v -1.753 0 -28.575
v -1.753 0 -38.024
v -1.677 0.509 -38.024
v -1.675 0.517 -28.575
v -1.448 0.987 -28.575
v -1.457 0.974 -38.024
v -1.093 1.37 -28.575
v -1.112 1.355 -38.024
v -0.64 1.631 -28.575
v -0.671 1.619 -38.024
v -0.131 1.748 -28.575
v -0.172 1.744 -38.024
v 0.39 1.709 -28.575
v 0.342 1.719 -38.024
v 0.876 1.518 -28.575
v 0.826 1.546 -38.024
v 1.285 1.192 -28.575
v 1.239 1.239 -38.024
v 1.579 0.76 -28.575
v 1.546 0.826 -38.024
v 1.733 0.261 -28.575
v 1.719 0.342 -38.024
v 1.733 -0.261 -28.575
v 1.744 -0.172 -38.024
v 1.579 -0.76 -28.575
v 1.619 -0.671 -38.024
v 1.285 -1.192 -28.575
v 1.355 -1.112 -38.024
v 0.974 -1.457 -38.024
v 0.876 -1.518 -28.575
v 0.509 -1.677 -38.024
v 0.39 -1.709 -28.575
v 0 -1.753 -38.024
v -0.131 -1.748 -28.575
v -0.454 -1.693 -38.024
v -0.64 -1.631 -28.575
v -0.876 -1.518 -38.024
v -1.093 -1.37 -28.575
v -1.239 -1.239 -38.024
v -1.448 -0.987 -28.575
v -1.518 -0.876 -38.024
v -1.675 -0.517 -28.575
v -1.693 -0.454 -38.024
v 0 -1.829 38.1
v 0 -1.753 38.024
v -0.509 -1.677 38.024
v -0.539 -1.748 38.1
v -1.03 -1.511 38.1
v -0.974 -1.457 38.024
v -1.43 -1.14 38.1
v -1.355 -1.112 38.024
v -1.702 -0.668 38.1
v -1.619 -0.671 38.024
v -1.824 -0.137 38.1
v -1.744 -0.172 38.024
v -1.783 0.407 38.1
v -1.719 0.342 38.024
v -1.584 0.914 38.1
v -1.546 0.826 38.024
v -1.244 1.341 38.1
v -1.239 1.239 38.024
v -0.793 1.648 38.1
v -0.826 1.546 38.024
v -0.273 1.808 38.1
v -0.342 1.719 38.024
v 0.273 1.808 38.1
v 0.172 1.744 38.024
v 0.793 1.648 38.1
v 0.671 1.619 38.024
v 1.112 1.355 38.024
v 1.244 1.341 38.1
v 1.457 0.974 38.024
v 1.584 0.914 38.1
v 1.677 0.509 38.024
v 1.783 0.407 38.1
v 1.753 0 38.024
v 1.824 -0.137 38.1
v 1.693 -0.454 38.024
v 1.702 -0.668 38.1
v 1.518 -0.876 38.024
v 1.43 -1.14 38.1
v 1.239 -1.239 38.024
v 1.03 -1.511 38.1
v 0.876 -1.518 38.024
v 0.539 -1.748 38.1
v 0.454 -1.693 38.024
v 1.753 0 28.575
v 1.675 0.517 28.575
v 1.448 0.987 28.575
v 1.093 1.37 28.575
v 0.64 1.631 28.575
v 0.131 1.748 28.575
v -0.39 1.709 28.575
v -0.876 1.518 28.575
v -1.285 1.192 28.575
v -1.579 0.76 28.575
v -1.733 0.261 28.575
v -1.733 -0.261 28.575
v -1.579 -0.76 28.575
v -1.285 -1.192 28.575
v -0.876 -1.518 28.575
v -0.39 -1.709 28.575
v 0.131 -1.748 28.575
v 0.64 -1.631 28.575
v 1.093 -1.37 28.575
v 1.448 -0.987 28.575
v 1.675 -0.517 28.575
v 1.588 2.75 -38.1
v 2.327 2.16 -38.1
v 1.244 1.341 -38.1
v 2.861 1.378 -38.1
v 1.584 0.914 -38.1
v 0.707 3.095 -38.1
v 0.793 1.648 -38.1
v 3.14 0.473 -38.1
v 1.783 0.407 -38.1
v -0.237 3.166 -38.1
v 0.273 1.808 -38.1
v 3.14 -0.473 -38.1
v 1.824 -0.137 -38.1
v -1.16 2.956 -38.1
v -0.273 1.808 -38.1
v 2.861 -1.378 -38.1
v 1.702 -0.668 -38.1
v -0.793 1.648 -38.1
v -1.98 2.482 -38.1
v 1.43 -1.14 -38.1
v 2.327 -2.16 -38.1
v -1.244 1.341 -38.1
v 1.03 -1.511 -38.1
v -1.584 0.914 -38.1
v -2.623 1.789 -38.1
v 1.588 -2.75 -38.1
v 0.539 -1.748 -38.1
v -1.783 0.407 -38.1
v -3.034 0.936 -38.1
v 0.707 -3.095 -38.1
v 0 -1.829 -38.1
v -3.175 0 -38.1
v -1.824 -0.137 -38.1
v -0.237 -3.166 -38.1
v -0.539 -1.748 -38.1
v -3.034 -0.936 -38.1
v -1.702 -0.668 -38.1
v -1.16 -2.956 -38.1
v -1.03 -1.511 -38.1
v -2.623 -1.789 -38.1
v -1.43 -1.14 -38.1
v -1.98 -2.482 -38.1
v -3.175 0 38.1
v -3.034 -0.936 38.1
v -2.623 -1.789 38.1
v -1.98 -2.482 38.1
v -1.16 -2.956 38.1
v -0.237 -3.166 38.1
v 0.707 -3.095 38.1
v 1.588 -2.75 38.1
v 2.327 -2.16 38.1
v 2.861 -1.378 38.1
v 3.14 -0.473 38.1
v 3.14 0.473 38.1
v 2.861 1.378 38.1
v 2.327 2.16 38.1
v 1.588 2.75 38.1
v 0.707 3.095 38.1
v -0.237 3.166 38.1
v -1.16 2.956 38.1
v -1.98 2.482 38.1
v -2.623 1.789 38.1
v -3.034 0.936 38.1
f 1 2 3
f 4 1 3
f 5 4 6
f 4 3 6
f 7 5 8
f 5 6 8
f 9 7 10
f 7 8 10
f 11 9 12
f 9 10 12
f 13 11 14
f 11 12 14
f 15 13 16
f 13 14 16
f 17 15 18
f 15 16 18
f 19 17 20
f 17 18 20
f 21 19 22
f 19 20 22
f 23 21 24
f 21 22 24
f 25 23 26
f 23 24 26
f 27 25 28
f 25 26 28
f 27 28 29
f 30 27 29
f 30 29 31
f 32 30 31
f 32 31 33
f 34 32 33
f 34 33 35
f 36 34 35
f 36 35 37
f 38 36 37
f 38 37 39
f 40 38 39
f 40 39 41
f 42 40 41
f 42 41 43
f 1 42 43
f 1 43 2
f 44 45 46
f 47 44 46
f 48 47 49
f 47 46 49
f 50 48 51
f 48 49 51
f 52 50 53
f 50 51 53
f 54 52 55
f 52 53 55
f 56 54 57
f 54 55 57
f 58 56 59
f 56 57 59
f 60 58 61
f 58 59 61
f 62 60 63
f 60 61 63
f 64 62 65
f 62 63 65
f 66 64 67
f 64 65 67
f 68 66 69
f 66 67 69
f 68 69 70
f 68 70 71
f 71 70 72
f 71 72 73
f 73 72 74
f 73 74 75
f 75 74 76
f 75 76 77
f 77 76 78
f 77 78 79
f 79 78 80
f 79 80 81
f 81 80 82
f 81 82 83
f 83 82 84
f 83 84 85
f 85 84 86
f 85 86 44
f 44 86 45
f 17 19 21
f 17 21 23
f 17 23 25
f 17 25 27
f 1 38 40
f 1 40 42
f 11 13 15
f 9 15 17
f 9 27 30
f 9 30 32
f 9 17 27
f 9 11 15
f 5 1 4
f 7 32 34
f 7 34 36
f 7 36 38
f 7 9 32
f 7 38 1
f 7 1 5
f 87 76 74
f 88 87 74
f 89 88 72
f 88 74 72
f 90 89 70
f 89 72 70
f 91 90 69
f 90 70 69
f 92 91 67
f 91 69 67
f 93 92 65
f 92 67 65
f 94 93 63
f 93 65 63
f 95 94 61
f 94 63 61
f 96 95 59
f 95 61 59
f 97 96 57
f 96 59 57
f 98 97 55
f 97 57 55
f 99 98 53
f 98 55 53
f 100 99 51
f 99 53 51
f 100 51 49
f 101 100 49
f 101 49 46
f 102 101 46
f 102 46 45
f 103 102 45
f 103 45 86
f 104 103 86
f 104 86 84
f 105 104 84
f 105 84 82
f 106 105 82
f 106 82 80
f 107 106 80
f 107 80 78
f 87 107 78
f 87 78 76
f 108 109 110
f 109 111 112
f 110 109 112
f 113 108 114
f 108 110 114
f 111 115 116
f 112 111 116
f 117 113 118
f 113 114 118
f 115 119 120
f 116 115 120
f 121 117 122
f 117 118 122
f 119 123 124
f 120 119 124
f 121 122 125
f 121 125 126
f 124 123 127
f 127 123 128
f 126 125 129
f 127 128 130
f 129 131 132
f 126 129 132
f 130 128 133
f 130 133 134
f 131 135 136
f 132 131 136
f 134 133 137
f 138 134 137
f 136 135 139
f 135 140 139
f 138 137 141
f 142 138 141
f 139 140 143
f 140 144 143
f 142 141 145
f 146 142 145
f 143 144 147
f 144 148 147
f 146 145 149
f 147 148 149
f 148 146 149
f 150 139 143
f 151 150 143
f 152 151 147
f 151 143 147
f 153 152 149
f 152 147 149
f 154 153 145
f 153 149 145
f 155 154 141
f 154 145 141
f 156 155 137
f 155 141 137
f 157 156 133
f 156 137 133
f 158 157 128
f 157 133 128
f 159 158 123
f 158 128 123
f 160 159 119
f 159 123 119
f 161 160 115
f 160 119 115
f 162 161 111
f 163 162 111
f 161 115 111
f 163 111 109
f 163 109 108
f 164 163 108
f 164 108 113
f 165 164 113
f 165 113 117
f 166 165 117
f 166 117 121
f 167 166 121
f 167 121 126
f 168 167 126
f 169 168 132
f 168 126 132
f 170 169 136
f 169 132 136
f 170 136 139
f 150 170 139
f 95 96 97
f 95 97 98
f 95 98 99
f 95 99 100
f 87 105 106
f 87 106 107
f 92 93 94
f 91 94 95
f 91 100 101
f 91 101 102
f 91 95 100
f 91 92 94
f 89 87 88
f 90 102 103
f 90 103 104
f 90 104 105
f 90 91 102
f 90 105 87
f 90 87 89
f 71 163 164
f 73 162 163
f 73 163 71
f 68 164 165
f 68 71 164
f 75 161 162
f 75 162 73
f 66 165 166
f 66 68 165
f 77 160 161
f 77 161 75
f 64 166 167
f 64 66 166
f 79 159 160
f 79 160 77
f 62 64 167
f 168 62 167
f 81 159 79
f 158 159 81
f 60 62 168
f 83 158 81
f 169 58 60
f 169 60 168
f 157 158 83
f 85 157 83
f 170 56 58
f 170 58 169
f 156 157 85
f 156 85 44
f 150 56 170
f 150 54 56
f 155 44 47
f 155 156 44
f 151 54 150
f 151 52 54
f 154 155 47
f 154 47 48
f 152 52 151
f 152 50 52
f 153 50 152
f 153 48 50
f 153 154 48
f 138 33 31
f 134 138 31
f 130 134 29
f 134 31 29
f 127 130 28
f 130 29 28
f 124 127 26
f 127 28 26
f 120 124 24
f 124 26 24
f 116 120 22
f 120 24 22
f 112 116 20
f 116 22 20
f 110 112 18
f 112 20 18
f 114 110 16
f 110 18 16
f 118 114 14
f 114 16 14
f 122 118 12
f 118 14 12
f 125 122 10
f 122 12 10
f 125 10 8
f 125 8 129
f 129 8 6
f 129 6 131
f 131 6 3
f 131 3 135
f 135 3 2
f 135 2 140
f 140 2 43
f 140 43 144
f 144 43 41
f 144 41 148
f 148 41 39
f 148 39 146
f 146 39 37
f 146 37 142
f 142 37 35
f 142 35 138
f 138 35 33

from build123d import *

# Parameters (mm, degrees)
BOSS_EXTRUDE1_START = 38.1
SKETCH13_R          = 1.7526
BOSS_EXTRUDE1_DEPTH = 9.525
CIRPATTERN1_COUNT   = 2
CIRPATTERN1_ANGLE   = 180
EXTRUDE1_DEPTH      = 38.1
EXTRUDE1_DEPTH_BACK = 38.1
SKETCH1_R           = 3.175


with BuildPart() as part:
    # Sketch13 → Boss-Extrude1 (new body)
    with BuildSketch(Plane.XY.offset(BOSS_EXTRUDE1_START)):
        Circle(SKETCH13_R)
    extrude(amount=-BOSS_EXTRUDE1_DEPTH)

    # Boss-Extrude2 cone 1 section (through the dimple's axis) → Boss-Extrude2 (revolve)
    with BuildSketch(Plane(origin=(0, 0, 38.1), x_dir=(0, -1, 0), z_dir=(1, 0, 0))):
        Polygon((0, 0), (1.8288, 0), (0, 1.8288), align=None)
    revolve(axis=Axis((0, 0, 38.1), (0, 0, -1)))


with BuildPart() as cirpattern1_1:
    # CirPattern1: pattern copy
    add(part.part.rotate(Axis((0, 3.175, 0), (0, -1, 0)), 1 * CIRPATTERN1_ANGLE / (CIRPATTERN1_COUNT - 1)))


with BuildPart() as body_3:
    # Sketch1 → Extrude1 (new, two sides: drawn at the far end of the back side and taken through both)
    with BuildSketch(Plane.XY.offset(-EXTRUDE1_DEPTH_BACK)):
        with Locations(Location((0, 0, 0), (0, 0, 180))):
            Circle(SKETCH1_R)
    extrude(amount=EXTRUDE1_DEPTH + EXTRUDE1_DEPTH_BACK)

    # Combine1: cut CirPattern1_1, part
    add(cirpattern1_1.part, mode=Mode.SUBTRACT)
    add(part.part, mode=Mode.SUBTRACT)


solid = body_3.part
